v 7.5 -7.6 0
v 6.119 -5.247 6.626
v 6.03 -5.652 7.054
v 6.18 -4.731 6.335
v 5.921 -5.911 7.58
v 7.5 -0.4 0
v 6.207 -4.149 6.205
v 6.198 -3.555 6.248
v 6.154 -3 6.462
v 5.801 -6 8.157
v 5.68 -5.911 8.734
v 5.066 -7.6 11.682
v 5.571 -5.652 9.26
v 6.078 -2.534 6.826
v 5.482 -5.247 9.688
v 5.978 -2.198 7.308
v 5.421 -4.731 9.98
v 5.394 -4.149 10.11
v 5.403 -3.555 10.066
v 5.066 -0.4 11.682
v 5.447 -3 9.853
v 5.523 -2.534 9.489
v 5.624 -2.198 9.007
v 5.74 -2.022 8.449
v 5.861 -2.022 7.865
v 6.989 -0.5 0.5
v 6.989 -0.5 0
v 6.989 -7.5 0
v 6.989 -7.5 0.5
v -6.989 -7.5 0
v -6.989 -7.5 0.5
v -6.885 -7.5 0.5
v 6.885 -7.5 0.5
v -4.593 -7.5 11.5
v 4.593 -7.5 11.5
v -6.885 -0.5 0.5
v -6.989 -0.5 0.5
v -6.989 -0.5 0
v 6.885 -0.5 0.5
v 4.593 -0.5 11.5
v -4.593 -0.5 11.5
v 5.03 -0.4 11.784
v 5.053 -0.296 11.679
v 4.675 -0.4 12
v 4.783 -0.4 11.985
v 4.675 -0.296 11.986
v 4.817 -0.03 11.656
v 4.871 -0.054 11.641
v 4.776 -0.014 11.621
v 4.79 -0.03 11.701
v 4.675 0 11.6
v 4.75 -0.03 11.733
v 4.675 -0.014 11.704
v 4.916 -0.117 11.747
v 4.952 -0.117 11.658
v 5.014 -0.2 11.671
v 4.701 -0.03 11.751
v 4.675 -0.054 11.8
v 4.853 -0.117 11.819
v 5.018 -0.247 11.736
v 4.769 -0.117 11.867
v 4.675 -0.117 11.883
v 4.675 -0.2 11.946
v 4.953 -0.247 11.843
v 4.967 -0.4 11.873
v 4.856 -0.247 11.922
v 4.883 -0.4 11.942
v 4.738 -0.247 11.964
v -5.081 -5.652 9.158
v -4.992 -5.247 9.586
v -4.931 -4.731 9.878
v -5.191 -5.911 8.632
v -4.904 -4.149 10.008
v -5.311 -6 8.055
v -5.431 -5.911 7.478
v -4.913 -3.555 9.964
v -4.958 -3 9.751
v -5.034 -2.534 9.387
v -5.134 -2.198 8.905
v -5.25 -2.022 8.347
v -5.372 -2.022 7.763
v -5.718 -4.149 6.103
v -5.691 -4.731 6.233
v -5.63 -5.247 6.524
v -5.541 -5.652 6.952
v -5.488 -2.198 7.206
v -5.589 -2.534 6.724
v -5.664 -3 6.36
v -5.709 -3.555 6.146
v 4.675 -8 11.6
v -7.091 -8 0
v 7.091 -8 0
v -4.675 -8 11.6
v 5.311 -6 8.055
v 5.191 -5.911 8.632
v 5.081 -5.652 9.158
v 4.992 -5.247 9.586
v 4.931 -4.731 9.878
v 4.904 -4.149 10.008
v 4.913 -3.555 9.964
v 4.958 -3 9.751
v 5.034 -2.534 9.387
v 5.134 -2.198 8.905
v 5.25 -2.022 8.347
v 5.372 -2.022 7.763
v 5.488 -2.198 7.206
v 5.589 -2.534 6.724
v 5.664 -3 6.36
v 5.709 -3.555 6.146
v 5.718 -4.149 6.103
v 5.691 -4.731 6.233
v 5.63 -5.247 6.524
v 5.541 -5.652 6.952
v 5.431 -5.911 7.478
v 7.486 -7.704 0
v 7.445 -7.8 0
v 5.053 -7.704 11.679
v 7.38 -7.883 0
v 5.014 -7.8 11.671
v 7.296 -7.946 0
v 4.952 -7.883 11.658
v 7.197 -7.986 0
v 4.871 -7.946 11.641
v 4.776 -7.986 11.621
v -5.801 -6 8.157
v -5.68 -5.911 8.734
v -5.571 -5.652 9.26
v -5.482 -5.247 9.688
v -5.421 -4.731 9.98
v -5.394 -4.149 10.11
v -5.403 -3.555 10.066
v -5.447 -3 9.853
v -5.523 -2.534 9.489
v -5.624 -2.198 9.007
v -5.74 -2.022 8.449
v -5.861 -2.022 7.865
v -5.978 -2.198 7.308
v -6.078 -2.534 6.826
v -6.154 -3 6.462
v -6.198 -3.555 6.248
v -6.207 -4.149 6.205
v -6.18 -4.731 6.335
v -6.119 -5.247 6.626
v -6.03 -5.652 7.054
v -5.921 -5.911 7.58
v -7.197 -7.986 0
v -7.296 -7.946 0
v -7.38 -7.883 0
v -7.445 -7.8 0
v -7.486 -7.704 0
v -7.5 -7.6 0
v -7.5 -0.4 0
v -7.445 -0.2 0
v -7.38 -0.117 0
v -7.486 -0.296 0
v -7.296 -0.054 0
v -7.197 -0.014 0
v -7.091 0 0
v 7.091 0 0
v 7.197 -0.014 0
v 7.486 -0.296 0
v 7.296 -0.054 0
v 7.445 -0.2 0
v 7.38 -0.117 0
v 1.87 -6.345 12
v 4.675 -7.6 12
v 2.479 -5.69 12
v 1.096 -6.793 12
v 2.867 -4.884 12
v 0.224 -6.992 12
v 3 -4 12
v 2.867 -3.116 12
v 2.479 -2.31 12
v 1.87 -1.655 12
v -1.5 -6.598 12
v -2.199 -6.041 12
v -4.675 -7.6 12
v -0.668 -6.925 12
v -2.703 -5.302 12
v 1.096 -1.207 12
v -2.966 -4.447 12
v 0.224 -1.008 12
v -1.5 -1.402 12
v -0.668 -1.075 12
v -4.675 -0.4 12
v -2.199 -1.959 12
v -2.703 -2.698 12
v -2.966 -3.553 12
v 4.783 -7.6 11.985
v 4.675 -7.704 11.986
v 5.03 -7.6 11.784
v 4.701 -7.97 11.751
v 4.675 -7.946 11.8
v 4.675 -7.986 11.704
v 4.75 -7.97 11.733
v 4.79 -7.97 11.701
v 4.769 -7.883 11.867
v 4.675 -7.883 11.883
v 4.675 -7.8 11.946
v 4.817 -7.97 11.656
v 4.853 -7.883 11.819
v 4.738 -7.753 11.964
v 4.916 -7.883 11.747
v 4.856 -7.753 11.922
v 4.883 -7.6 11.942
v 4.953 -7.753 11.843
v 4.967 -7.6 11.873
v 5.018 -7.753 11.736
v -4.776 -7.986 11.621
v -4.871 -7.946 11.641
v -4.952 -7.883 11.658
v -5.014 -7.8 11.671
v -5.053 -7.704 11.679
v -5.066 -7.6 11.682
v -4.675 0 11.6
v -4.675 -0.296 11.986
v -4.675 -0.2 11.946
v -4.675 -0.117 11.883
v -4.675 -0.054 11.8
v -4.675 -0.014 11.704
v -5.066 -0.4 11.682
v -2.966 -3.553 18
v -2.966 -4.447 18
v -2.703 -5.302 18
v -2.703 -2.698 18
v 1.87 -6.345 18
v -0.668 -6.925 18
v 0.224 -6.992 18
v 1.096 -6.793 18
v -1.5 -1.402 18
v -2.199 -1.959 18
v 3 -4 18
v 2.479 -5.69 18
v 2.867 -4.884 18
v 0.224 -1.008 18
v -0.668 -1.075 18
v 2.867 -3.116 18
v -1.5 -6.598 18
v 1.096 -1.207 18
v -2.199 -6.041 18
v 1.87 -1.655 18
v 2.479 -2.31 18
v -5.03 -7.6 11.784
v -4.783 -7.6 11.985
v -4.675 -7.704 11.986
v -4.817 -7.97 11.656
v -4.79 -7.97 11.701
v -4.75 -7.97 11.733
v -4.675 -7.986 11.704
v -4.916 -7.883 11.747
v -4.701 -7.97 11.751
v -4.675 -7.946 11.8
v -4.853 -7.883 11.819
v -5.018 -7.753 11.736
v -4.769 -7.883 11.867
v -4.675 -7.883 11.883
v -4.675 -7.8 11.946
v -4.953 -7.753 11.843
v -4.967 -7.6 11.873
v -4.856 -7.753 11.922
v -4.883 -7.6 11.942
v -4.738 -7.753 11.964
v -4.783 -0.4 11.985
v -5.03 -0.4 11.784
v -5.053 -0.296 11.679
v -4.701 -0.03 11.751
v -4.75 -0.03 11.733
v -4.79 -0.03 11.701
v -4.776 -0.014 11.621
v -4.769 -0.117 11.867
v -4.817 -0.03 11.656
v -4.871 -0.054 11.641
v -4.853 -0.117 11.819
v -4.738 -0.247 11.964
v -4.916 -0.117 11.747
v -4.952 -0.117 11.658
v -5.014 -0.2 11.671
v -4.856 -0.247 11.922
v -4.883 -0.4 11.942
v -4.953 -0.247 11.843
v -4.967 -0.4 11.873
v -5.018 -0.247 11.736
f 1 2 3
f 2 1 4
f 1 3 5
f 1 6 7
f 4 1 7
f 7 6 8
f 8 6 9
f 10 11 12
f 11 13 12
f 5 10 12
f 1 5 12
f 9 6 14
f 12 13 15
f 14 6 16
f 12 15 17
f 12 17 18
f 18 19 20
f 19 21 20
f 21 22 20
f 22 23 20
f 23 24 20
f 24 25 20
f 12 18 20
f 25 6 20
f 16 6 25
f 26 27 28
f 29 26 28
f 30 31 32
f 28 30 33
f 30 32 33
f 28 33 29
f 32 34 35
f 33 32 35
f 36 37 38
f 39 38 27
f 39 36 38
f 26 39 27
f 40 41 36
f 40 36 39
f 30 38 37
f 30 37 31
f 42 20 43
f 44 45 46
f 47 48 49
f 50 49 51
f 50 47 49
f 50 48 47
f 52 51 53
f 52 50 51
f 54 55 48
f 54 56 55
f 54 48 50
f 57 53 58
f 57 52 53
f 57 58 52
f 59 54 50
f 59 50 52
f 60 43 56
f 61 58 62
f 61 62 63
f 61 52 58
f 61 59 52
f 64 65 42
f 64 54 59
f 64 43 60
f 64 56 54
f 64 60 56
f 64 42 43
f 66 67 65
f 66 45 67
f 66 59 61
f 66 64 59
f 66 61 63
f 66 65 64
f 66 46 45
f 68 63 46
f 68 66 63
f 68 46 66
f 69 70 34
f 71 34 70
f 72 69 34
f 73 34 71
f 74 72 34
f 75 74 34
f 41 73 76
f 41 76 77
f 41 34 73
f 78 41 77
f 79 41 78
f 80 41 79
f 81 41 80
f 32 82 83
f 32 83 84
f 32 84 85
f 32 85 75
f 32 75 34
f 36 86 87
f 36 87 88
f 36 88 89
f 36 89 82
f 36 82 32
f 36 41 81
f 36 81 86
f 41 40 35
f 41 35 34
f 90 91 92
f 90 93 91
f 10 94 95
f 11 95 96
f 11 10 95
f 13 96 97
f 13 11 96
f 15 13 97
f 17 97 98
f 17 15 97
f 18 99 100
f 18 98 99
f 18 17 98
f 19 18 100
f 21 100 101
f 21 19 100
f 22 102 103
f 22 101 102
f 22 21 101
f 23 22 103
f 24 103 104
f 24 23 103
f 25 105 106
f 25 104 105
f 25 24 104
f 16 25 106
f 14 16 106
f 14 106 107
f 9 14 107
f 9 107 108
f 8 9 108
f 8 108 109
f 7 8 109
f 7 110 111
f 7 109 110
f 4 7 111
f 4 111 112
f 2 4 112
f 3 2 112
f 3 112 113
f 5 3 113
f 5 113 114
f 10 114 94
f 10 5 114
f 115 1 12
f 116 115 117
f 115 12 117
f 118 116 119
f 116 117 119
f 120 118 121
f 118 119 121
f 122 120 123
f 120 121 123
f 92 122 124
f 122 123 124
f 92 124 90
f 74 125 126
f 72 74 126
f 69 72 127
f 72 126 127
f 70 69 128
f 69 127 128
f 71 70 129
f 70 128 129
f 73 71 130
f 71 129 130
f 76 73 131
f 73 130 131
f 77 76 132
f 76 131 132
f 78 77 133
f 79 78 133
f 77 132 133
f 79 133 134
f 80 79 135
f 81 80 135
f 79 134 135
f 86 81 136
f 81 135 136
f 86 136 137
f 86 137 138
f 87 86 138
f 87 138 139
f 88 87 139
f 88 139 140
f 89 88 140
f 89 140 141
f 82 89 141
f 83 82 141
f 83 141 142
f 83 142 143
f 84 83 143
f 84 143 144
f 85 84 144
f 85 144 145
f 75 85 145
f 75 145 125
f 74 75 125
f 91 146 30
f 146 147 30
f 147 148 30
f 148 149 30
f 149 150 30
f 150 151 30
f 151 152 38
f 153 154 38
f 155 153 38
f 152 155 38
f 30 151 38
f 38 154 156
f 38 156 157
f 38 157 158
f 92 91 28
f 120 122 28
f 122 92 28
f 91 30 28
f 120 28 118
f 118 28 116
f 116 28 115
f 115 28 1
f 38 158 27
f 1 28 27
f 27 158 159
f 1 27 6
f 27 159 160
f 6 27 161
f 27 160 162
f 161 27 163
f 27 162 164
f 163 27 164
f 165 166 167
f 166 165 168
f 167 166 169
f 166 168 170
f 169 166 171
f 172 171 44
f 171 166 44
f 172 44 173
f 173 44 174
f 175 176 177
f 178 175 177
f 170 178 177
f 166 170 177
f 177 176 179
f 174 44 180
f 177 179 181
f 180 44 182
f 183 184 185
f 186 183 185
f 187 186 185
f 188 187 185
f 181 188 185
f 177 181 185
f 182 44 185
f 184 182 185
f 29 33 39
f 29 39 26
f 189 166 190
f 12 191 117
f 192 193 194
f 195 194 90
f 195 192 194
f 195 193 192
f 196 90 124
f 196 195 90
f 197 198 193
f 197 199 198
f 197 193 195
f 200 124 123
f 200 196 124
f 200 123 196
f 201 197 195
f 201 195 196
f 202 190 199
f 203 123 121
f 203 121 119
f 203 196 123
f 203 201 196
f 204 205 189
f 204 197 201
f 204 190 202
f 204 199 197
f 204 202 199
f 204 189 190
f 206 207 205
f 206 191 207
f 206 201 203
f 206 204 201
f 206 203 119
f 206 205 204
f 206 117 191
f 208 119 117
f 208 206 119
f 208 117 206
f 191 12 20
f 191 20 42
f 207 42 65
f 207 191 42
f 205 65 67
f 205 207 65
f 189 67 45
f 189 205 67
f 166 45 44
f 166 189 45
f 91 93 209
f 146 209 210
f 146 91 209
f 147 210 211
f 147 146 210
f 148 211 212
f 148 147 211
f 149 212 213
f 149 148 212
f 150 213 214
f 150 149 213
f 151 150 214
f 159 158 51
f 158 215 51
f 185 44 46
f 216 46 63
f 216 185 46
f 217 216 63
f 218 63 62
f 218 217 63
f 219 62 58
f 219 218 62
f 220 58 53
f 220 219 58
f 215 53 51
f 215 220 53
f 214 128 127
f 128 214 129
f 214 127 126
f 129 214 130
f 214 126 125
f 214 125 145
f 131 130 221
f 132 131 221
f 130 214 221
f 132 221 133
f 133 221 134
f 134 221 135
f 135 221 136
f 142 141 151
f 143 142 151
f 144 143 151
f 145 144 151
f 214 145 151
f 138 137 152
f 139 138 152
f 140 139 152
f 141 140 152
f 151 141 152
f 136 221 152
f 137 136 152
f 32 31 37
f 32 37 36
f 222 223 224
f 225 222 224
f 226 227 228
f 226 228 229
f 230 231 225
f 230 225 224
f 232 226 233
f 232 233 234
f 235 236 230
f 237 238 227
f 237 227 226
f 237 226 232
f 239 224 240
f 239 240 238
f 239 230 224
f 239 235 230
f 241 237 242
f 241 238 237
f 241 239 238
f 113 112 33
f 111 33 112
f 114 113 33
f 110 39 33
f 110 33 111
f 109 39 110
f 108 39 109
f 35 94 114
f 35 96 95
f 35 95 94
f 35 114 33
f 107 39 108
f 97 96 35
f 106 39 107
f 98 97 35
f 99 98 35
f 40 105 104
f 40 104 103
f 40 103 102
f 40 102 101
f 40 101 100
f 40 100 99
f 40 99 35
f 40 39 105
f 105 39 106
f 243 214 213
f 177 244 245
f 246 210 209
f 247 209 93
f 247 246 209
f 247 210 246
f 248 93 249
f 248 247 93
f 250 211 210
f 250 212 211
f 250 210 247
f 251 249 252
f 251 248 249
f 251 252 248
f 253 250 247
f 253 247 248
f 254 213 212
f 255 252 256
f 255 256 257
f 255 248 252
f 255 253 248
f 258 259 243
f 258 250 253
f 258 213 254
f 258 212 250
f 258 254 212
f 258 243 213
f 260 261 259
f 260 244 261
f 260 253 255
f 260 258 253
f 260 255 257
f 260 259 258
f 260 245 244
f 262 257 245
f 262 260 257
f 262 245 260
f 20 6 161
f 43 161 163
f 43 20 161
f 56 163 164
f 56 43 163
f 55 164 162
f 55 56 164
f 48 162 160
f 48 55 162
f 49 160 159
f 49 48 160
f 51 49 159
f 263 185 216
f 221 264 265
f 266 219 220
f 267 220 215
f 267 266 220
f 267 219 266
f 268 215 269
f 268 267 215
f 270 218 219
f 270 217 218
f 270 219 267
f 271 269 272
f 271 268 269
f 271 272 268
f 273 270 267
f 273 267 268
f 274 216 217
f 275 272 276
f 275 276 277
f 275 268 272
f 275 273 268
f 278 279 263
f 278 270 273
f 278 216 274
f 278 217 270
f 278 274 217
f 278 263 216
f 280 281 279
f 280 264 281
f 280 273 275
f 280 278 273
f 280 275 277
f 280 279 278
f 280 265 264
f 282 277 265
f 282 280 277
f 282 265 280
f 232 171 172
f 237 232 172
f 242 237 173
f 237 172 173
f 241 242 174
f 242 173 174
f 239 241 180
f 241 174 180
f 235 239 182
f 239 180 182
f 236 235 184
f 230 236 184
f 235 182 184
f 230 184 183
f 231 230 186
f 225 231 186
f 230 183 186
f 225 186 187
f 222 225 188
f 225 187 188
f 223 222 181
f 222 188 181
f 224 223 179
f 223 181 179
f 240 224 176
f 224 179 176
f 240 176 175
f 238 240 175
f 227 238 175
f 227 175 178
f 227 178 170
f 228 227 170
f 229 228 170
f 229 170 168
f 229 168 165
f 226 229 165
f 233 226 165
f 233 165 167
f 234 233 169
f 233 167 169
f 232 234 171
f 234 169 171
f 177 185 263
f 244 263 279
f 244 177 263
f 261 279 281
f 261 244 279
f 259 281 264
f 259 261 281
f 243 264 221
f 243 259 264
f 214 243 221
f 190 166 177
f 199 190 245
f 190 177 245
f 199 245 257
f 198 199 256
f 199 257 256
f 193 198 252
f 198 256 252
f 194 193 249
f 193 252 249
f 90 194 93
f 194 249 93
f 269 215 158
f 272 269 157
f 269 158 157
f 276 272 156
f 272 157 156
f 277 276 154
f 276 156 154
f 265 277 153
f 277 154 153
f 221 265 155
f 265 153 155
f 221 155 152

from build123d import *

# Parameters (mm, degrees)
F1_DEPTH = 8
F2_T     = -0.5
F3_W     = 13.9785291107
F3_H     = 7
F4_DEPTH = 0.5
F5_R     = 0.4
F6_R     = 2
F7_DEPTH = 1
F8_R     = 3
F9_DEPTH = 6


# Not quite as in the source:
# - a pattern or mirror of a feature is missing from the dataset's text; its kind, count and spacing are read off the source's solid


with BuildPart() as f1:
    # F0 (on Front) → F1 (new body)
    with BuildSketch(Plane.XZ):
        Polygon((-7.5, 0), (0, 0), (7.5, 0), (5, 12), (0, 12), (-5, 12), align=None)
    extrude(amount=F1_DEPTH)

    # F2
    f2_openings = [f1.faces().sort_by_distance(p)[0] for p in [
        (0, -4, 0),
    ]]
    offset(amount=F2_T, openings=f2_openings)

    # F3 (on face) → F4 (cut)
    with BuildSketch(Plane(origin=(0, 0, 0), x_dir=(1, 0, 0), z_dir=(0, 0, -1))):
        with Locations((0, 4)):
            Rectangle(F3_W, F3_H)
    extrude(amount=-F4_DEPTH, mode=Mode.SUBTRACT)

    # F5
    f5_edges = [f1.edges().sort_by_distance(p)[0] for p in [
        (6.25, -8, 6),
        (5, -4, 12),
        (0, -8, 12),
        (6.25, 0, 6),
        (0, 0, 12),
        (-6.25, 0, 6),
        (-5, -4, 12),
        (-6.25, -8, 6),
    ]]
    fillet(f5_edges, radius=F5_R)

    # F6 (on face) → F7 (cut)
    with BuildSketch(Plane(origin=(-7.1880199667, 0, 1.4975041597), x_dir=(0, -1, 0), z_dir=(-0.9789804197, 0, 0.2039542541))):
        with Locations((4, 6.8027387439)):
            Circle(F6_R)
    f7 = extrude(amount=-F7_DEPTH, mode=Mode.SUBTRACT)

    # F7_copies: F7 across plane
    add(f7.mirror(Plane(origin=(0, 0, 0), x_dir=(0, 0, 1), z_dir=(1, 0, 0))), mode=Mode.SUBTRACT)

    # F8 (on face) → F9 (join)
    with BuildSketch(Plane.XY.offset(12)):
        with Locations((0, -4)):
            Circle(F8_R)
    extrude(amount=F9_DEPTH)


solid = f1.part
